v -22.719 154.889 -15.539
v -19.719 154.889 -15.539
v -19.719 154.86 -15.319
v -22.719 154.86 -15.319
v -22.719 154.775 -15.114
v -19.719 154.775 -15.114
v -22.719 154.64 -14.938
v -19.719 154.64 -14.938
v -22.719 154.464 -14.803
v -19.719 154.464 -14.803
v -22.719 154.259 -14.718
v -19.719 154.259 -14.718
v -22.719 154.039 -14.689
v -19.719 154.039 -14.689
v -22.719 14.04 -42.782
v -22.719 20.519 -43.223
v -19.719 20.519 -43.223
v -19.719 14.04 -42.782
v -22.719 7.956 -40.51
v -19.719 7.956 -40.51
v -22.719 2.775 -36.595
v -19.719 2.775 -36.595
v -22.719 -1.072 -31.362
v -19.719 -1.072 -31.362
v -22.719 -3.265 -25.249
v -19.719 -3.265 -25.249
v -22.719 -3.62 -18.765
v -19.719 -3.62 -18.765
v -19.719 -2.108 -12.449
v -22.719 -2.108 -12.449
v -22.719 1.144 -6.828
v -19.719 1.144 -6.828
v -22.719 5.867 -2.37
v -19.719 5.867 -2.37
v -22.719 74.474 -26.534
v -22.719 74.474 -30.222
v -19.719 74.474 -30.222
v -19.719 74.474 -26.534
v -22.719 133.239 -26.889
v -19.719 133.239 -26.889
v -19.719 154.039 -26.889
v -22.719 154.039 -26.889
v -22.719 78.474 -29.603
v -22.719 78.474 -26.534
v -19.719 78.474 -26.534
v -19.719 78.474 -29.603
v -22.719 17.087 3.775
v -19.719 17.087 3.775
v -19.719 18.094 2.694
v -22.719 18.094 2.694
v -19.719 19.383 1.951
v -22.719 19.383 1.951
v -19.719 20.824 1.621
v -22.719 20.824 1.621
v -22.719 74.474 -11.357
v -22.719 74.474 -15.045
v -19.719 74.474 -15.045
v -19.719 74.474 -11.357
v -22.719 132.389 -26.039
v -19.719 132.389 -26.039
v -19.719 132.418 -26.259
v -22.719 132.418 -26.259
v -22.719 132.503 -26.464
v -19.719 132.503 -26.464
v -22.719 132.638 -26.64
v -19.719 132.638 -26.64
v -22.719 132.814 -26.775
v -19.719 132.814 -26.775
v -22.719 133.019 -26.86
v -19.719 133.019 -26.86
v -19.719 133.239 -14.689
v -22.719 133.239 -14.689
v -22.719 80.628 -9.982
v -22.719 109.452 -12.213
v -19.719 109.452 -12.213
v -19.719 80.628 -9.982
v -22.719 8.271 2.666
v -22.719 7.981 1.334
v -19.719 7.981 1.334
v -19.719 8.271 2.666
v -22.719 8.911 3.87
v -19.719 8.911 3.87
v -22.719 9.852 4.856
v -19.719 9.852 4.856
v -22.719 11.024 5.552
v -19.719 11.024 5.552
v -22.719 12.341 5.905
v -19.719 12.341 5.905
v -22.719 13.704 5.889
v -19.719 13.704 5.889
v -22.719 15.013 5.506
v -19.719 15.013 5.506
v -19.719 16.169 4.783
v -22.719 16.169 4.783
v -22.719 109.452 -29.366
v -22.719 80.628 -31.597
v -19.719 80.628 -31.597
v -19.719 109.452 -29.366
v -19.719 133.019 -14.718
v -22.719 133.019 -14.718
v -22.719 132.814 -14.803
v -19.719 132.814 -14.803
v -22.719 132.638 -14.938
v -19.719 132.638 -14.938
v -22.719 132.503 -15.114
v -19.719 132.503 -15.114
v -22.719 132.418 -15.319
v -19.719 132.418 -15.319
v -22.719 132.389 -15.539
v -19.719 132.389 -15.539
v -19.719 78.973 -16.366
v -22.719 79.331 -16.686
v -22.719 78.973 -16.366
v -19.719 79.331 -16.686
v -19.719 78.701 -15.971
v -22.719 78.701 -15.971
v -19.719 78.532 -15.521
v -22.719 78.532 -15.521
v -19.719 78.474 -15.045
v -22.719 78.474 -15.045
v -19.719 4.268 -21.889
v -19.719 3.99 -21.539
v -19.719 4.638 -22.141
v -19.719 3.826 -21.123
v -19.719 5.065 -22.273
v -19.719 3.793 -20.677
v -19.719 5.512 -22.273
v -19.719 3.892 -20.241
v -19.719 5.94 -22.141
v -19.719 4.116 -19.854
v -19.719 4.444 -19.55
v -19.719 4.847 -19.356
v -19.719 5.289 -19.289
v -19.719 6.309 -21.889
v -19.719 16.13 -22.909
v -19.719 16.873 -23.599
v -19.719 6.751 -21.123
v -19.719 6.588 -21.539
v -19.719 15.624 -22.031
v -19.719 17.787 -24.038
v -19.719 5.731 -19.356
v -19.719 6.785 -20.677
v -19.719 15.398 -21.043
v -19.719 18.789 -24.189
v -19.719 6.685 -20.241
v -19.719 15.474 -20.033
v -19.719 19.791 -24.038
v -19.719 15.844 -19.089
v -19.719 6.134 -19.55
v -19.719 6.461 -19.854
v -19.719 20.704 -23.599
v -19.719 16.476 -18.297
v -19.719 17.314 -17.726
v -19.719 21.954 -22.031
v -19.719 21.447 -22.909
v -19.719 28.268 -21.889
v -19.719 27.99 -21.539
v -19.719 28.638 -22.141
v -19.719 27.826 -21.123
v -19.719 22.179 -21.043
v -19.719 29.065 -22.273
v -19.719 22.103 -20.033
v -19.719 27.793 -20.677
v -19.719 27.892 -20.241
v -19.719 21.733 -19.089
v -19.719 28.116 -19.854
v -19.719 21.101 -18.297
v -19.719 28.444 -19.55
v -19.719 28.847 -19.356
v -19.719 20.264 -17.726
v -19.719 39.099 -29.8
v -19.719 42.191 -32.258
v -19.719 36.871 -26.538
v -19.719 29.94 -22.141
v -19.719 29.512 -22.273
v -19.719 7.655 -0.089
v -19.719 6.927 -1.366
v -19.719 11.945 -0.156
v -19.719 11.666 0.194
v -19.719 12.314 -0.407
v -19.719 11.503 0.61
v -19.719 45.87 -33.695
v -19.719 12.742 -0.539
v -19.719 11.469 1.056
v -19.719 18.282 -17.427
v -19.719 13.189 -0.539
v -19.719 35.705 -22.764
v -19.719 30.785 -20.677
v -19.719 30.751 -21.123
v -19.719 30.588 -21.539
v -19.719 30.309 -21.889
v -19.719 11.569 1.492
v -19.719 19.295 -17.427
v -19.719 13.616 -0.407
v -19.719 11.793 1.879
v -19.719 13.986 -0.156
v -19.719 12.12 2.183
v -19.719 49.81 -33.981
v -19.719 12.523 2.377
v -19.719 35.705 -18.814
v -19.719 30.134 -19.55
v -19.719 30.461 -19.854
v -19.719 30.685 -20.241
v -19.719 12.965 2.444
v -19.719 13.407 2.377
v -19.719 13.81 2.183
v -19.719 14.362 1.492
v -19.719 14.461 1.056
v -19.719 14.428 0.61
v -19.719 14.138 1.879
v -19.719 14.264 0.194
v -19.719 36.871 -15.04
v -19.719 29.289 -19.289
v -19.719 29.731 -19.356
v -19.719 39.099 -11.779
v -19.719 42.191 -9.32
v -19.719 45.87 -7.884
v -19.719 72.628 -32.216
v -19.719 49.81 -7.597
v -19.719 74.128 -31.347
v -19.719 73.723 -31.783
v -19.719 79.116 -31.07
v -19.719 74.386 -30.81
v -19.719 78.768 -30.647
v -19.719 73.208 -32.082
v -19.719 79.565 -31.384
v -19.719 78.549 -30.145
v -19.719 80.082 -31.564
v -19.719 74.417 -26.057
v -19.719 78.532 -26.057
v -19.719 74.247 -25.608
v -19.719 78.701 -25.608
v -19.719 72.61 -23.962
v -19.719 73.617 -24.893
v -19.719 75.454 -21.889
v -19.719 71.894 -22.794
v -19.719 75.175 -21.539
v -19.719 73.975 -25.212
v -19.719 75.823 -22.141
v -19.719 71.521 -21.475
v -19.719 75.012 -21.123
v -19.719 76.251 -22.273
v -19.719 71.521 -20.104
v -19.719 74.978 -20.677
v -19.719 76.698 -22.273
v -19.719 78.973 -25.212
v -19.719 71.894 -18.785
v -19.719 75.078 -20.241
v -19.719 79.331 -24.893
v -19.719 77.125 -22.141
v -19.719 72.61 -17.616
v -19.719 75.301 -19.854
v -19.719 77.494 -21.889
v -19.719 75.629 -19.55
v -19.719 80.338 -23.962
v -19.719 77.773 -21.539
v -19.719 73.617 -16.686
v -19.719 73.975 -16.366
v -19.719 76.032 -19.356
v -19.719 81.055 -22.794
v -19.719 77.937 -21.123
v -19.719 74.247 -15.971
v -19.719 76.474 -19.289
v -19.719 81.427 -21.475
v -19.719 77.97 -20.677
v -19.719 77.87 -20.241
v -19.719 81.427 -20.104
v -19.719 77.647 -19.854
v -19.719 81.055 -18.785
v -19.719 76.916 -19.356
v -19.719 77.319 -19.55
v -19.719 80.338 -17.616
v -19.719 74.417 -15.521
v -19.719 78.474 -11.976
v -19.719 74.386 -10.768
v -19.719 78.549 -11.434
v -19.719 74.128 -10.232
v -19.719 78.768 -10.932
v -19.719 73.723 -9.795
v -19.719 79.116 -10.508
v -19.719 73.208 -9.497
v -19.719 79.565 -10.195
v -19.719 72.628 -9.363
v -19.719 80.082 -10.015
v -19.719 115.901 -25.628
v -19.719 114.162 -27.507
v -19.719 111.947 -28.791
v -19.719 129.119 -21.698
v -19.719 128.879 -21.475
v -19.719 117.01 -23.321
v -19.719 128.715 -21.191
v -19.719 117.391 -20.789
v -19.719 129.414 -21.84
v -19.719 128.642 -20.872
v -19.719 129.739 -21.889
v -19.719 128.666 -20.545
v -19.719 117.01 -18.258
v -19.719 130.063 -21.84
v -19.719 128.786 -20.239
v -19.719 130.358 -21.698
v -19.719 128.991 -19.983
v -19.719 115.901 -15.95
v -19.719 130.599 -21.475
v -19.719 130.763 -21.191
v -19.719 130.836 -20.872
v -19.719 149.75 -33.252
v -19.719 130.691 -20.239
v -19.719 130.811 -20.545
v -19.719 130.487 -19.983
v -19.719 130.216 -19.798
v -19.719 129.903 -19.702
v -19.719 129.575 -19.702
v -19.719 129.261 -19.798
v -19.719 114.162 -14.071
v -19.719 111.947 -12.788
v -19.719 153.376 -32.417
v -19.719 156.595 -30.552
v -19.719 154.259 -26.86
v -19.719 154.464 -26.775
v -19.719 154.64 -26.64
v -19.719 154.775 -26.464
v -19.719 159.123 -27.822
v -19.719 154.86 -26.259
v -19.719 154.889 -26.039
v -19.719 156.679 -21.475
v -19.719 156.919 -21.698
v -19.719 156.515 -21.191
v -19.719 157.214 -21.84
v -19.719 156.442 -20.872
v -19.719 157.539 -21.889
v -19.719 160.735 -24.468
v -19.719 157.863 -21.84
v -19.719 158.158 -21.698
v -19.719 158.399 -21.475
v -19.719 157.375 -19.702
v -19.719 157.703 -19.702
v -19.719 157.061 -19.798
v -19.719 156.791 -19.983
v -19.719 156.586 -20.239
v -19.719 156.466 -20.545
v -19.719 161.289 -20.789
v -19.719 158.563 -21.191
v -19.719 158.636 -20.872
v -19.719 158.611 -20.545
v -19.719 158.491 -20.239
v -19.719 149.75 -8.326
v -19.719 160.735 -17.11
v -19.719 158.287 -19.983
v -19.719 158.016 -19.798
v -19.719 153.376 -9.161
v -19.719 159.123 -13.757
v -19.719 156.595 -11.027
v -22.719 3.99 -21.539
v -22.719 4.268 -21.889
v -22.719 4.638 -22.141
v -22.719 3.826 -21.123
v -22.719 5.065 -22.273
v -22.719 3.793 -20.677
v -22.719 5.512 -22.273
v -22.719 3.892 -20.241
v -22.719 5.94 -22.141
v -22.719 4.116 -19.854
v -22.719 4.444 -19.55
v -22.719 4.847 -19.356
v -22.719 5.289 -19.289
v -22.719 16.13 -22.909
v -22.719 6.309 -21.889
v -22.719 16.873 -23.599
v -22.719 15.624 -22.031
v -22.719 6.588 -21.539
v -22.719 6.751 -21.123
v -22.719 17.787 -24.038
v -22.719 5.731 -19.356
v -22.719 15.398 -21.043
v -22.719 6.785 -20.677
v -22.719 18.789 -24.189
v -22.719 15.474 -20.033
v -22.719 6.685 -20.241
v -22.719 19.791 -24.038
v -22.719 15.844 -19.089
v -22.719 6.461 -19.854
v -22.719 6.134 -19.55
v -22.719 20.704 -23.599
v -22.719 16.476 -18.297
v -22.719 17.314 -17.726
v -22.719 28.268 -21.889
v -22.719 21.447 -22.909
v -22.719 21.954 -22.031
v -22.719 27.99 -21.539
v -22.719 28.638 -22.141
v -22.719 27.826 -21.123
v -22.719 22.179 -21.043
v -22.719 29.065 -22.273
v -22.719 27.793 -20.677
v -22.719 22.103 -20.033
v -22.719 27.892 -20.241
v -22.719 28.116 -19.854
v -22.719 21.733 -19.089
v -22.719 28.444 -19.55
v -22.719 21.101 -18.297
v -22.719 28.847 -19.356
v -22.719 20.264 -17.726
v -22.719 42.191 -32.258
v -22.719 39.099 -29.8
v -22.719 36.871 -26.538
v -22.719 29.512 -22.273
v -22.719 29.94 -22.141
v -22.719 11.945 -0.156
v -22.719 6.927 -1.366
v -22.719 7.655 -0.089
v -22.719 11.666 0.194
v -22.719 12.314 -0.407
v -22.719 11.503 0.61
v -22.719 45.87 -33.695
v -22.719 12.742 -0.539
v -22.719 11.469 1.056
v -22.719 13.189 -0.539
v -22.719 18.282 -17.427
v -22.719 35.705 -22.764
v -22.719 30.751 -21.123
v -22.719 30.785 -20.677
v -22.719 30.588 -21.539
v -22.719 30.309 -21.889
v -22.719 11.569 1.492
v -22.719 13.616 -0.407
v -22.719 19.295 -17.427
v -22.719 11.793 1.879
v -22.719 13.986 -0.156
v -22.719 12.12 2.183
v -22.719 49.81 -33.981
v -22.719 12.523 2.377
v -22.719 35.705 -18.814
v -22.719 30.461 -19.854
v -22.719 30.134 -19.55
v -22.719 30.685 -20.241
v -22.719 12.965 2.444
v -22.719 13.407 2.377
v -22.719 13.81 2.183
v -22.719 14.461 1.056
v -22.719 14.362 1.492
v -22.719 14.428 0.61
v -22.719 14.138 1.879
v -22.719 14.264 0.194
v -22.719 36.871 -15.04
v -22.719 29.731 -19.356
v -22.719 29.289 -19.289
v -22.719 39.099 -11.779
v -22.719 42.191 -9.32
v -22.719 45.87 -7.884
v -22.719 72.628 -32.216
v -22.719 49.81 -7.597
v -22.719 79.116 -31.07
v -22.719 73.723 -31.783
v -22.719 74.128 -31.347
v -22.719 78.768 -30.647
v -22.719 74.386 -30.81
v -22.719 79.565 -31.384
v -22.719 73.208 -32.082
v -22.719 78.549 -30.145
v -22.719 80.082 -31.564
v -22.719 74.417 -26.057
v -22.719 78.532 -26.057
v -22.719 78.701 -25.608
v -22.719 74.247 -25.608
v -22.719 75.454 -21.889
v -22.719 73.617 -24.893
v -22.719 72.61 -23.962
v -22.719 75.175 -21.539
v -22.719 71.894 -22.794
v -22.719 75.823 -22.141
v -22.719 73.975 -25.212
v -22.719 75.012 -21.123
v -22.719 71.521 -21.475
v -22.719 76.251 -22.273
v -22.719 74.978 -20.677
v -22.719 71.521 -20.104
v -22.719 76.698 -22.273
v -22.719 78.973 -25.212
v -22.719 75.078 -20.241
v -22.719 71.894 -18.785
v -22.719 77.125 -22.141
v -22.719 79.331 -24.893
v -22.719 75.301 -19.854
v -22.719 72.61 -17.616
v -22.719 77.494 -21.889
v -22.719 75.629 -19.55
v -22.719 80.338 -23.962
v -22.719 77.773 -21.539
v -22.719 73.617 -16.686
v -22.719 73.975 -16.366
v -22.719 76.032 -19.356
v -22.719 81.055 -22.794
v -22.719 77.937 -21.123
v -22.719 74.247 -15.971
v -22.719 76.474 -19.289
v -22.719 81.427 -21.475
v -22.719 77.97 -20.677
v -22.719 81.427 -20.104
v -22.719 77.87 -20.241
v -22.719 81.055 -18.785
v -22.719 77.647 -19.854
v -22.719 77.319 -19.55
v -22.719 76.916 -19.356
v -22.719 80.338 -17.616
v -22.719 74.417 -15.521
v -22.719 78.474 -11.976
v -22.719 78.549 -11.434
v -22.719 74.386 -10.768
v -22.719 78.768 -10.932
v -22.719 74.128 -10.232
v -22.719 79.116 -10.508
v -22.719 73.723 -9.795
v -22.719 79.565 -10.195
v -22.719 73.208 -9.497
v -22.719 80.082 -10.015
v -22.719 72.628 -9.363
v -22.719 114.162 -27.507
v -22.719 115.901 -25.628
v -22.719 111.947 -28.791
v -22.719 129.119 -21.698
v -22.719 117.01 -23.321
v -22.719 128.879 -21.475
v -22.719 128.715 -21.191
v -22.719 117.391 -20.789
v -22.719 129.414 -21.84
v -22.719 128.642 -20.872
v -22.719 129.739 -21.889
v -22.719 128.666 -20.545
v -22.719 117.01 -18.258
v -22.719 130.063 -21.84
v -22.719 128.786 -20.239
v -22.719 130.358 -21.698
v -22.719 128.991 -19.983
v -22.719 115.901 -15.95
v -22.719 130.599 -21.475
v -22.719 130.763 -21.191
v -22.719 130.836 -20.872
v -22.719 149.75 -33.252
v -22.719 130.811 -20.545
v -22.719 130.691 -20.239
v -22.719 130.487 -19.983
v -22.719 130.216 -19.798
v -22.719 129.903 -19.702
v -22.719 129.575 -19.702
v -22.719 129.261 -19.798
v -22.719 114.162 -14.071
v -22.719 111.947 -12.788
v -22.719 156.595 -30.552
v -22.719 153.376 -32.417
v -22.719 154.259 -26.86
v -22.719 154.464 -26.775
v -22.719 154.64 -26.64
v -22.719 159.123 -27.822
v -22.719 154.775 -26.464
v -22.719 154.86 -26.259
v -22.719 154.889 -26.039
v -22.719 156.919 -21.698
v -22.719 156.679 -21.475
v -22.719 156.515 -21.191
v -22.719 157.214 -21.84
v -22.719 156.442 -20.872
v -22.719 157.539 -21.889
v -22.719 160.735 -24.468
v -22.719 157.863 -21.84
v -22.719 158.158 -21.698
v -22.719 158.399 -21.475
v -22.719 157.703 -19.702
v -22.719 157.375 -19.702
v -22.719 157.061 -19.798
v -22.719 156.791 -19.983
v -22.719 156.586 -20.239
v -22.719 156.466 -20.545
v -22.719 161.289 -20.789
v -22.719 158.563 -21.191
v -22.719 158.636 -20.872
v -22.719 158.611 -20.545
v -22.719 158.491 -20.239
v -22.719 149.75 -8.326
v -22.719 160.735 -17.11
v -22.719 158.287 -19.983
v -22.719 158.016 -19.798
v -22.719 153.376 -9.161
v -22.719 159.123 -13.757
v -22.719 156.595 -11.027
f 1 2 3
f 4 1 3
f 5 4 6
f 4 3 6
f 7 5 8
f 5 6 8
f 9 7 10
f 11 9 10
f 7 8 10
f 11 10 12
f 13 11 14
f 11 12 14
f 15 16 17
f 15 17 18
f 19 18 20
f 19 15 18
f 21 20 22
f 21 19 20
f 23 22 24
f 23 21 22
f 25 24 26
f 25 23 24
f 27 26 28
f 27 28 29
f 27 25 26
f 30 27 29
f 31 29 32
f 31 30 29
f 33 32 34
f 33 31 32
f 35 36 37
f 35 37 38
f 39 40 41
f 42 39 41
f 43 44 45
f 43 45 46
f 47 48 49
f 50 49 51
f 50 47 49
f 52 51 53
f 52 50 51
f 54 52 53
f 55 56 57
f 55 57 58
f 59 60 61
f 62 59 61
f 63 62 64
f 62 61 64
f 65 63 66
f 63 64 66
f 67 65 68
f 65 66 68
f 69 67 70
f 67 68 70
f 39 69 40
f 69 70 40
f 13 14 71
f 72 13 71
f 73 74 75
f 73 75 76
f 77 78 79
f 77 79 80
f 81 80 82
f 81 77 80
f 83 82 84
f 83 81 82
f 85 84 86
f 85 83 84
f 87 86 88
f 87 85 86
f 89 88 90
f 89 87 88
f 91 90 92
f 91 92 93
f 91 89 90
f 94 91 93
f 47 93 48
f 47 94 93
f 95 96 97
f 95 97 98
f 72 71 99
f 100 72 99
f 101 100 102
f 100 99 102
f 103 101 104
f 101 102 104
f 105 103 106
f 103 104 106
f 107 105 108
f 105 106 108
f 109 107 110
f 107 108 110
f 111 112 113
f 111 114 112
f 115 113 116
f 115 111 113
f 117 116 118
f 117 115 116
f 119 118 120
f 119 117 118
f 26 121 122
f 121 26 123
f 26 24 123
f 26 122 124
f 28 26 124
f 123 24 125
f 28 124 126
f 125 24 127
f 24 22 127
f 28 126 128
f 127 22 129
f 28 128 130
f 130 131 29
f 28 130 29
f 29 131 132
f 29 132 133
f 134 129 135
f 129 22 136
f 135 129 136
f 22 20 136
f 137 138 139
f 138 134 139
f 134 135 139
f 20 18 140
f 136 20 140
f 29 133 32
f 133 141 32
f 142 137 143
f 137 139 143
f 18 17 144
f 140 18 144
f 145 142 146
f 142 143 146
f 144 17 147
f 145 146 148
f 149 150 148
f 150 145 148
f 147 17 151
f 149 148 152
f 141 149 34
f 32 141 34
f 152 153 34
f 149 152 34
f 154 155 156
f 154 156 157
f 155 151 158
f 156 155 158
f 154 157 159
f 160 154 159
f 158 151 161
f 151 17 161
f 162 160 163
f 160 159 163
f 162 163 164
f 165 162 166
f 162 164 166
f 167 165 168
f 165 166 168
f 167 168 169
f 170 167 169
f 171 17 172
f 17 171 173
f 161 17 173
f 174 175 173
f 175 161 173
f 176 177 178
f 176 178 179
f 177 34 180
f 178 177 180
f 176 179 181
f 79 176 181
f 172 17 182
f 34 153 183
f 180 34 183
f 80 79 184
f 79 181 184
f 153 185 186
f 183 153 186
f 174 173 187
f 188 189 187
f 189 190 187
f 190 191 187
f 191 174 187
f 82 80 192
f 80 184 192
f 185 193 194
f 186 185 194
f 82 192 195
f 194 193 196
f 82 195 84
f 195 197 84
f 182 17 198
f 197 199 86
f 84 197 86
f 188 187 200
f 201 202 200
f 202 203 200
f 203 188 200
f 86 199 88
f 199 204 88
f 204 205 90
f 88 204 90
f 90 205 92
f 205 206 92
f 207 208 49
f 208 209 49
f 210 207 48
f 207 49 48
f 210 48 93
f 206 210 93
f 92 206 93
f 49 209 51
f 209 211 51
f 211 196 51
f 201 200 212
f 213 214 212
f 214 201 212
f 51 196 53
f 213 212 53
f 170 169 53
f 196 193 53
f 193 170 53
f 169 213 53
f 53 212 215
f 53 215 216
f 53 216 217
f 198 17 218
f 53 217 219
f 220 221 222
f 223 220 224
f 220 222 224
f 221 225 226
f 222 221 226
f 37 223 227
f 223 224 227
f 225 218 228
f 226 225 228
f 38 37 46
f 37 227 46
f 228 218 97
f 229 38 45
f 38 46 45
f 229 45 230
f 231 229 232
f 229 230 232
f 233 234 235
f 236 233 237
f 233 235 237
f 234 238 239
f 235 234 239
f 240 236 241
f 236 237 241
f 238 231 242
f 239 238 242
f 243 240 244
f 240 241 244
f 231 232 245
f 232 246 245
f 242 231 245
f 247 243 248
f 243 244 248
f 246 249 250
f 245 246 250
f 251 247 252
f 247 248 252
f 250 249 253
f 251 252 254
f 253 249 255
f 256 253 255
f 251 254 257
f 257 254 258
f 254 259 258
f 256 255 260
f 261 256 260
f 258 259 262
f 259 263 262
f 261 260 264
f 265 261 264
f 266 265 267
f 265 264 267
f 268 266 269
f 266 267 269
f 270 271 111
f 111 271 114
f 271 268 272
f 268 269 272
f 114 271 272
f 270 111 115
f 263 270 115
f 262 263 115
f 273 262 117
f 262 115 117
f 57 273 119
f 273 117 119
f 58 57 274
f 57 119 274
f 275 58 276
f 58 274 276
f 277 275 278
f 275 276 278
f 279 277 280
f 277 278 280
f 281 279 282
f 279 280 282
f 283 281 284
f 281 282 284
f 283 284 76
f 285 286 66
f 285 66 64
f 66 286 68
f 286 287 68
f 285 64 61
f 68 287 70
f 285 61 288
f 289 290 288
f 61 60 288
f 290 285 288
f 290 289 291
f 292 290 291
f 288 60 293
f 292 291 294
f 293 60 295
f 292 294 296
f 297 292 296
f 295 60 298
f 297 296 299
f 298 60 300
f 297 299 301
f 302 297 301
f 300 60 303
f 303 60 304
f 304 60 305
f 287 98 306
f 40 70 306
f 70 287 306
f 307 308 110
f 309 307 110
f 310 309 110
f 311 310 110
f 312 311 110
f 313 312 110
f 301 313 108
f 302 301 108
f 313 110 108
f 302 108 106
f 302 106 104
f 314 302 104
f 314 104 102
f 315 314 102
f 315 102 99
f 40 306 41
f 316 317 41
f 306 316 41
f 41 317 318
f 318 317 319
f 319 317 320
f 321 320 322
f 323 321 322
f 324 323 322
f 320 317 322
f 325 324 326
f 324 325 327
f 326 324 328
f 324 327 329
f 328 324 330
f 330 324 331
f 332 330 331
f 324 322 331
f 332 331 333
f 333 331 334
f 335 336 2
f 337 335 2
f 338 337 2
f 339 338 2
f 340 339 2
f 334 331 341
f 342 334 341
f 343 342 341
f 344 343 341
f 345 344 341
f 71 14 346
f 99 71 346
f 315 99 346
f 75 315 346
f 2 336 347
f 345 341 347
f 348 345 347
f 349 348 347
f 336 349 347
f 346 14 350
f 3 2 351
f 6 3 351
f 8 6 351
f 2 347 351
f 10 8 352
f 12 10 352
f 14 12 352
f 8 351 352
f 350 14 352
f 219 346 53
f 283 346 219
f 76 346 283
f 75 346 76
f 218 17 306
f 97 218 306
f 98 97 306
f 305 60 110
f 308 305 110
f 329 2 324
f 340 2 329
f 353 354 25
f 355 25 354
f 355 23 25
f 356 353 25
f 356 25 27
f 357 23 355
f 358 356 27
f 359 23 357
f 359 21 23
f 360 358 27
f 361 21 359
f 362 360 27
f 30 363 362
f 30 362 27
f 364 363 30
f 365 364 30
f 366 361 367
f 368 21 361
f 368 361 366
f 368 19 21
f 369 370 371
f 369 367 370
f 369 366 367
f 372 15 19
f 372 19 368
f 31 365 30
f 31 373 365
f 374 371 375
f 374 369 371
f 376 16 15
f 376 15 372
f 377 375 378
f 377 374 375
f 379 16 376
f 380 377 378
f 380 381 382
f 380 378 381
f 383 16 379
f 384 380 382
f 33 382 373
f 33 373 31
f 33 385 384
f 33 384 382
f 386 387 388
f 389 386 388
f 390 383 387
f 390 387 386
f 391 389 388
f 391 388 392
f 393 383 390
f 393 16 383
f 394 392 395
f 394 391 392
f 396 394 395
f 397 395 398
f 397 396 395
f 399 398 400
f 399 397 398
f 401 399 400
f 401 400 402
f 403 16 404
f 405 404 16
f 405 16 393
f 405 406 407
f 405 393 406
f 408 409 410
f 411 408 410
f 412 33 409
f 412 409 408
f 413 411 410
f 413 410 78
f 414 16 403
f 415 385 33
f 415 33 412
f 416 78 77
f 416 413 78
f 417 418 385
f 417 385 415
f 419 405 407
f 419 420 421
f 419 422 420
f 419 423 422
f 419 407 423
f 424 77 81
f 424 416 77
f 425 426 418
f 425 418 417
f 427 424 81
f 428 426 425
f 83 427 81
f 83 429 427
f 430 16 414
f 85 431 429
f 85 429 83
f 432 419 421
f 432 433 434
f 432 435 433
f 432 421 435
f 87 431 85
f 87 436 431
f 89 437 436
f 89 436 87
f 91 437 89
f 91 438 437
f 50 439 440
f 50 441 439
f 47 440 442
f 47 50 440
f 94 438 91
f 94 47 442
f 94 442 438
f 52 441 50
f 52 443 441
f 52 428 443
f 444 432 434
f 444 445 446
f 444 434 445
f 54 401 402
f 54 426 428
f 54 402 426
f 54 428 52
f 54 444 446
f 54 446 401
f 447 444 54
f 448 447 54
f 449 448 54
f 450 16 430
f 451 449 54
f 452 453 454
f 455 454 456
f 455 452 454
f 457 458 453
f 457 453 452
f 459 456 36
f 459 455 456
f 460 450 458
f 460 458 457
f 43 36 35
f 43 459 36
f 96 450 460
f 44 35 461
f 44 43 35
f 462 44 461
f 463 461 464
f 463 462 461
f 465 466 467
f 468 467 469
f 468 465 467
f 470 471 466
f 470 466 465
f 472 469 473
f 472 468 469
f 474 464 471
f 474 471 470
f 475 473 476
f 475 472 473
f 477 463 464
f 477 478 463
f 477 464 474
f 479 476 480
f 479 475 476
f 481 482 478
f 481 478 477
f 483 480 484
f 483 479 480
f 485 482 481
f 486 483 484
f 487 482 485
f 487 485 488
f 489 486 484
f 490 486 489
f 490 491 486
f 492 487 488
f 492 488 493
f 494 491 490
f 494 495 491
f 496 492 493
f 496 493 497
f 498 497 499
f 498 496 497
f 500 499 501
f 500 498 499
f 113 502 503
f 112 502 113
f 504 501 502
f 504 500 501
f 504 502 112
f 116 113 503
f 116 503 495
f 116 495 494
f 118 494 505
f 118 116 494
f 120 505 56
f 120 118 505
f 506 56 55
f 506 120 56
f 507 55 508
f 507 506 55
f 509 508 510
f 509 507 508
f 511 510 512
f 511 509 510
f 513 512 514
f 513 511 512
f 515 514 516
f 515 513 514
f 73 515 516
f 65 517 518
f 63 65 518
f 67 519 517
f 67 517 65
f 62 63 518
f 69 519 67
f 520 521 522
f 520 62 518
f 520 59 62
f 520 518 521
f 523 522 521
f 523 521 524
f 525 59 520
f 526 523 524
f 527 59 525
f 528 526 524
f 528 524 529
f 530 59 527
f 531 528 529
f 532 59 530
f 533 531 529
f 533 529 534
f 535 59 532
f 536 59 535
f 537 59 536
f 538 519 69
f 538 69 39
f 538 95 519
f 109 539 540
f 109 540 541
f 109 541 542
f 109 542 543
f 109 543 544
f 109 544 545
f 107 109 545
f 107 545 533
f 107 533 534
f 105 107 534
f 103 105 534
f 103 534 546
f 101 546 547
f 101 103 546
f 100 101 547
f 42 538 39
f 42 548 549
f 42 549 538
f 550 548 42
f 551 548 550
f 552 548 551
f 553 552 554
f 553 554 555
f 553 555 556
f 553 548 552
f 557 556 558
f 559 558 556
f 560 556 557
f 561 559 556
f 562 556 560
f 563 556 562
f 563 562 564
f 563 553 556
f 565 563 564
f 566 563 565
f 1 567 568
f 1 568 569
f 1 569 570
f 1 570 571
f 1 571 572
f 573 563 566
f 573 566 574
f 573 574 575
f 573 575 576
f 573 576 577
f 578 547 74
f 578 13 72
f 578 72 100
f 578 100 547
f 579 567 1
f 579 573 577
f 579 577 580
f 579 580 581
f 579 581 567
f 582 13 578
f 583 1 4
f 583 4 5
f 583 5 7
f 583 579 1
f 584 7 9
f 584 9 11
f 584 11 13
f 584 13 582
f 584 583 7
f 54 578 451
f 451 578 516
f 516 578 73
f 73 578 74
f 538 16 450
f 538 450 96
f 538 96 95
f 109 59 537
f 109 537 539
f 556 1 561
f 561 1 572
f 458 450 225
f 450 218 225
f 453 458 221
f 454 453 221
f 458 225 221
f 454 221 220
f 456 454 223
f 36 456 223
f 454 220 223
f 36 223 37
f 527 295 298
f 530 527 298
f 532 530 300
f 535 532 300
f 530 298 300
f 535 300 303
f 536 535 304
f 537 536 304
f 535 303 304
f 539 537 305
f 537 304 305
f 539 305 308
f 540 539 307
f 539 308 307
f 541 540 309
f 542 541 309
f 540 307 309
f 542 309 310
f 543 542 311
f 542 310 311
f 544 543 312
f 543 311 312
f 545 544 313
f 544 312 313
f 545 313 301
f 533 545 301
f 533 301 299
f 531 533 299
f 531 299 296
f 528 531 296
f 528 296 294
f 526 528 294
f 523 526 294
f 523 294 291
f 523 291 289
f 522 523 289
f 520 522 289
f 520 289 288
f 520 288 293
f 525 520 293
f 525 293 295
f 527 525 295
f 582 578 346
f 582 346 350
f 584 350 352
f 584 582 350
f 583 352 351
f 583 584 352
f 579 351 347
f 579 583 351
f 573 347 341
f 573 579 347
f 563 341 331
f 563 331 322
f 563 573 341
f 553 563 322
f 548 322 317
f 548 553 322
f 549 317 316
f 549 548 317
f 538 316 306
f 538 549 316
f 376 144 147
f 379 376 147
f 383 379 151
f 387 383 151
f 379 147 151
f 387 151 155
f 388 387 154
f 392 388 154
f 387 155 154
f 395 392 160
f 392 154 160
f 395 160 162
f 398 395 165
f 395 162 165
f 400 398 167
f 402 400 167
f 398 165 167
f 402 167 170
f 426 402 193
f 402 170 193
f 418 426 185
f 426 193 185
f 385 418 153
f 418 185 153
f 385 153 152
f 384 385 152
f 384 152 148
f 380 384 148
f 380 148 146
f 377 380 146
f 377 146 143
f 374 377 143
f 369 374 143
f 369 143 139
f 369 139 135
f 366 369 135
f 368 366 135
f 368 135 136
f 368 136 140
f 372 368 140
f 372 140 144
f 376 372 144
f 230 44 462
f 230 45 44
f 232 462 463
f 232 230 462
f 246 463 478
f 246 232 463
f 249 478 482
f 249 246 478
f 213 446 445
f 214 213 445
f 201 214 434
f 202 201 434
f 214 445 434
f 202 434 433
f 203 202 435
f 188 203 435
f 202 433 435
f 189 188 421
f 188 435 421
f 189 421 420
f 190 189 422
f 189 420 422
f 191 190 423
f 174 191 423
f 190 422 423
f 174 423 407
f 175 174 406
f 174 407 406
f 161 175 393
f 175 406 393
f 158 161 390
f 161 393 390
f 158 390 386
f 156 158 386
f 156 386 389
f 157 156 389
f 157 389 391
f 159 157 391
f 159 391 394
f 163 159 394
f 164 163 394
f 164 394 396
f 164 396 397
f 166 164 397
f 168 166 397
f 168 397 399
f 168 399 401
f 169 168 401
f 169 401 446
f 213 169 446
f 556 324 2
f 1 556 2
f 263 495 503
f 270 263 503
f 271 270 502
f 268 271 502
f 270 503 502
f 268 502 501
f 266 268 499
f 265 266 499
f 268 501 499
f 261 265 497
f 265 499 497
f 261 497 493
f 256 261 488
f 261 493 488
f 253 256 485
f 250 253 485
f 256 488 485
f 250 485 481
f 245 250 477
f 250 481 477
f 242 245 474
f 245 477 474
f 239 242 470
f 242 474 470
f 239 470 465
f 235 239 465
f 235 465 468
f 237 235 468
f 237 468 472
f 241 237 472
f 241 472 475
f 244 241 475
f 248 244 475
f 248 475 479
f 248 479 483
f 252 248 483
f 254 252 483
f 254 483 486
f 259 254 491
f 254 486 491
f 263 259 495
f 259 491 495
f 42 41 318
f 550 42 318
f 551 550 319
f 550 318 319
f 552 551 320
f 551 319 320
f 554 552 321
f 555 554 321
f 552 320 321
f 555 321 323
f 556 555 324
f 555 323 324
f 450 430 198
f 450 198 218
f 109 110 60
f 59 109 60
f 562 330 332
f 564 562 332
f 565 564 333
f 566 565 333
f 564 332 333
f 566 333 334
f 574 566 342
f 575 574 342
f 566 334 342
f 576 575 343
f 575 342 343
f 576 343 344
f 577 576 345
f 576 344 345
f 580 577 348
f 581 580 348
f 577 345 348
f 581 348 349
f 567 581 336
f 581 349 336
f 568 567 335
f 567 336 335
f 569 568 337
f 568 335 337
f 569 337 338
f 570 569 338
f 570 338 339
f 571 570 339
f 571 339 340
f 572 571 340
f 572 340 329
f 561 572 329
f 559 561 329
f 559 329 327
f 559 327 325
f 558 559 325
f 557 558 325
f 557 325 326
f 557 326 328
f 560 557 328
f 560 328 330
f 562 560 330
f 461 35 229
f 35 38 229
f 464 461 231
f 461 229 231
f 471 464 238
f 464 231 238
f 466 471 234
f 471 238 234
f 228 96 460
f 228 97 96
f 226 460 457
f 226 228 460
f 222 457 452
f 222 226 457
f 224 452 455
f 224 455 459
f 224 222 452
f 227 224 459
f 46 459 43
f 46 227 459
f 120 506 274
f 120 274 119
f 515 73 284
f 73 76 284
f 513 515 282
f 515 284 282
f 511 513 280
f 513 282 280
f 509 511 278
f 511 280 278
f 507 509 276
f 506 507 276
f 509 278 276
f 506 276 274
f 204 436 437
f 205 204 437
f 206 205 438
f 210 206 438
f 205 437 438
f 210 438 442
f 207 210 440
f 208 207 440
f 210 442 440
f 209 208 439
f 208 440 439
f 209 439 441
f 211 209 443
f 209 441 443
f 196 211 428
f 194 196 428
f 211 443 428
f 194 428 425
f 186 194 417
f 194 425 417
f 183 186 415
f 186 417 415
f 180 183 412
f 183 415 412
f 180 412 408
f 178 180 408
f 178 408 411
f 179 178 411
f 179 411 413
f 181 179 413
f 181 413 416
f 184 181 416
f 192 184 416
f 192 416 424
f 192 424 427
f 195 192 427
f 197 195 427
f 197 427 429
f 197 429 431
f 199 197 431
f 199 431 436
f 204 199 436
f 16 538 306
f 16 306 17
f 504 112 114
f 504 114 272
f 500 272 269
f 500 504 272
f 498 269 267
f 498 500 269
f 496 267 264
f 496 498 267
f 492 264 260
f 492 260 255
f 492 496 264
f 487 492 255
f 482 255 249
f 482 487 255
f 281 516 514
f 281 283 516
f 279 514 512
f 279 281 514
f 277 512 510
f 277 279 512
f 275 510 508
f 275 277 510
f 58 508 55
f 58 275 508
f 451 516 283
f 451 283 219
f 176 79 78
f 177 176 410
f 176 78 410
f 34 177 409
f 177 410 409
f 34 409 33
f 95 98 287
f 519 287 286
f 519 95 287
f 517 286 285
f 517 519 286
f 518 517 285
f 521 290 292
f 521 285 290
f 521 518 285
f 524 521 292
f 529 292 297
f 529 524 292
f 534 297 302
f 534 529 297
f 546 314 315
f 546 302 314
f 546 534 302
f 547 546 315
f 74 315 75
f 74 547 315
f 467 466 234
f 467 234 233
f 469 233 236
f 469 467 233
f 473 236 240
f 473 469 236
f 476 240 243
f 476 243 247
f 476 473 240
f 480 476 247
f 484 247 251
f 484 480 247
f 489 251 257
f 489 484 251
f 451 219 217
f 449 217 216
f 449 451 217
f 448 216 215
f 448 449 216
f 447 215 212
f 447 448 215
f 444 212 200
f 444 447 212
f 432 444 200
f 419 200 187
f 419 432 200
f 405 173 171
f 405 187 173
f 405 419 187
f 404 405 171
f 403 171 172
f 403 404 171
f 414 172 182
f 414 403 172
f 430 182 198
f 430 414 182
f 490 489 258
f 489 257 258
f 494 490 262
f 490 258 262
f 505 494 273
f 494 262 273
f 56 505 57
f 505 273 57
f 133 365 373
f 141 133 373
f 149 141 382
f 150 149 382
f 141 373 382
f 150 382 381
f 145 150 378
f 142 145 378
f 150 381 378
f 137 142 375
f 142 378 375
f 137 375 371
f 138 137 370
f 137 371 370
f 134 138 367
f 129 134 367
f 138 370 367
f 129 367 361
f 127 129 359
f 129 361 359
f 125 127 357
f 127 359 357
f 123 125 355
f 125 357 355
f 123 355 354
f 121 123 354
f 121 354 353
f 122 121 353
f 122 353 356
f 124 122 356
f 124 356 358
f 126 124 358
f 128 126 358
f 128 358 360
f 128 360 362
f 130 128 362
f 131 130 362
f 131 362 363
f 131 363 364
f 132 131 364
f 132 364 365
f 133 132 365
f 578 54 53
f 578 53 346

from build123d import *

# Parameters (mm, degrees)
BOSS_EXTRUDE1_DEPTH = 3
CUT_EXTRUDE1_REACH  = 169.024
SKETCH3_R           = 1.1
CUT_EXTRUDE2_REACH  = 169.024
SKETCH5_R           = 3.4
CUT_EXTRUDE3_REACH  = 169.024
SKETCH7_R           = 1.5
BOSS_EXTRUDE3_DEPTH = 3
FILLET1_R           = 2
SKETCH8_R           = 5
BOSS_EXTRUDE4_DEPTH = 3
CUT_EXTRUDE4_REACH  = 169.024
SKETCH9_R           = 1.5
FILLET2_R           = 5
CUT_EXTRUDE5_REACH  = 169.024
SKETCH10_R          = 1.5


with BuildPart() as part:
    # Sketch1 → Boss-Extrude1 (new body)
    with BuildSketch(Plane(origin=(-22.718758449, 0, 0), x_dir=(0, 0, -1), z_dir=(1, 0, 0))):
        with BuildLine():
            Line((33.252275896, 149.750258484), (43.222646201, 20.519489254))
            ThreePointArc((43.222646201, 20.519489254), (20.789313015, -3.711279977), (-1.644020172, 20.519489254))
            Line((-1.644020172, 20.519489254), (8.326350133, 149.750258484))
            ThreePointArc((8.326350133, 149.750258484), (20.789313015, 161.288720023), (33.252275896, 149.750258484))
        make_face()
    extrude(amount=BOSS_EXTRUDE1_DEPTH)

    # Sketch3 → Cut-Extrude1 (cut, up to next)
    with BuildSketch(Plane(origin=(-19.718758449, 0, 0), x_dir=(0, 0, -1), z_dir=(1, 0, 0)), mode=Mode.PRIVATE) as cut_extrude1_sk1:
        with Locations((20.789313015, 157.538720023)):
            Circle(SKETCH3_R)
    cut_extrude1_tool1 = extrude(cut_extrude1_sk1.sketch, amount=-CUT_EXTRUDE1_REACH, mode=Mode.PRIVATE) & part.part
    # Sketch3 → Cut-Extrude1 (cut, up to next)
    with BuildSketch(Plane(origin=(-19.718758449, 0, 0), x_dir=(0, 0, -1), z_dir=(1, 0, 0)), mode=Mode.PRIVATE) as cut_extrude1_sk2:
        with Locations((20.789313015, 129.738720023)):
            Circle(SKETCH3_R)
    cut_extrude1_tool2 = extrude(cut_extrude1_sk2.sketch, amount=-CUT_EXTRUDE1_REACH, mode=Mode.PRIVATE) & part.part
    # Sketch3 → Cut-Extrude1 (cut, up to next)
    with BuildSketch(Plane(origin=(-19.718758449, 0, 0), x_dir=(0, 0, -1), z_dir=(1, 0, 0)), mode=Mode.PRIVATE) as cut_extrude1_sk3:
        with BuildLine():
            Line((14.689313015, 154.038720023), (14.689313015, 148.788720023))
            Line((14.689313015, 148.788720023), (14.689313015, 133.238720023))
            ThreePointArc((14.689313015, 133.238720023), (14.938272251, 132.637679259), (15.539313015, 132.388720023))
            Line((15.539313015, 132.388720023), (26.039313015, 132.388720023))
            ThreePointArc((26.039313015, 132.388720023), (26.640353779, 132.637679259), (26.889313015, 133.238720023))
            Line((26.889313015, 133.238720023), (26.889313015, 148.788720023))
            Line((26.889313015, 148.788720023), (26.889313015, 154.038720023))
            ThreePointArc((26.889313015, 154.038720023), (26.640353779, 154.639760787), (26.039313015, 154.888720023))
            Line((26.039313015, 154.888720023), (20.789313015, 154.888720023))
            Line((20.789313015, 154.888720023), (15.539313015, 154.888720023))
            ThreePointArc((15.539313015, 154.888720023), (14.938272251, 154.639760787), (14.689313015, 154.038720023))
        make_face()
    cut_extrude1_tool3 = extrude(cut_extrude1_sk3.sketch, amount=-CUT_EXTRUDE1_REACH, mode=Mode.PRIVATE) & part.part
    add(cut_extrude1_tool1.solids().sort_by_distance((-19.718758, 157.53872, -20.789313))[0], mode=Mode.SUBTRACT)
    add(cut_extrude1_tool2.solids().sort_by_distance((-19.718758, 129.73872, -20.789313))[0], mode=Mode.SUBTRACT)
    add(cut_extrude1_tool3.solids().sort_by_distance((-19.718758, 143.63872, -20.789313))[0], mode=Mode.SUBTRACT)

    # Sketch5 → Cut-Extrude2 (cut, up to next)
    with BuildSketch(Plane(origin=(-19.718758449, 0, 0), x_dir=(0, 0, -1), z_dir=(1, 0, 0)), mode=Mode.PRIVATE) as cut_extrude2_sk1:
        with Locations((20.789313015, 18.788720023)):
            Circle(SKETCH5_R)
    cut_extrude2_tool1 = extrude(cut_extrude2_sk1.sketch, amount=-CUT_EXTRUDE2_REACH, mode=Mode.PRIVATE) & part.part
    add(cut_extrude2_tool1.solids().sort_by_distance((-19.718758, 18.78872, -20.789313))[0], mode=Mode.SUBTRACT)

    # Sketch6 → Cut-Extrude3 (cut, up to next)
    with BuildSketch(Plane.ZY.offset(22.718758449), mode=Mode.PRIVATE) as cut_extrude3_sk1:
        with BuildLine():
            Line((-12.212541883, 109.452410499), (-7.597239032, 49.809553356))
            ThreePointArc((-7.597239032, 49.809553356), (-20.789313015, 35.557207763), (-33.981386998, 49.809553356))
            Line((-33.981386998, 49.809553356), (-29.366084146, 109.452410499))
            ThreePointArc((-29.366084146, 109.452410499), (-20.789313015, 117.391131783), (-12.212541883, 109.452410499))
        make_face()
    cut_extrude3_tool1 = extrude(cut_extrude3_sk1.sketch, amount=-CUT_EXTRUDE3_REACH, mode=Mode.PRIVATE) & part.part
    add(cut_extrude3_tool1.solids().sort_by_distance((-22.718758, 73.705728, -20.789313))[0], mode=Mode.SUBTRACT)

    # Sketch7 → Boss-Extrude3 (add)
    with BuildSketch(Plane.ZY.offset(22.718758449)):
        with BuildLine():
            Line((-32.072781677, 74.474169773), (-25.37188871, 74.474169773))
            ThreePointArc((-25.37188871, 74.474169773), (-20.789313015, 71.474169773), (-16.20673732, 74.474169773))
            Line((-16.20673732, 74.474169773), (-9.505844352, 74.474169773))
            Line((-9.505844352, 74.474169773), (-9.815373645, 78.474169773))
            Line((-9.815373645, 78.474169773), (-16.20673732, 78.474169773))
            ThreePointArc((-16.20673732, 78.474169773), (-20.789313015, 81.474169773), (-25.37188871, 78.474169773))
            Line((-25.37188871, 78.474169773), (-31.763252384, 78.474169773))
            Line((-31.763252384, 78.474169773), (-32.072781677, 74.474169773))
        make_face()
        with Locations((-20.789313015, 76.474169773)):
            Circle(SKETCH7_R, mode=Mode.SUBTRACT)
    extrude(amount=-BOSS_EXTRUDE3_DEPTH)

    # Fillet1
    fillet1_edges = [part.edges().sort_by_distance(p)[0] for p in [
        (-21.218758449, 74.474169773, -32.072781677),
        (-21.218758449, 78.474169773, -31.763252384),
        (-21.218758449, 78.474169773, -25.37188871),
        (-21.218758449, 78.474169773, -16.20673732),
        (-21.218758449, 78.474169773, -9.815373645),
        (-21.218758449, 74.474169773, -9.505844352),
        (-21.218758449, 74.474169773, -16.20673732),
        (-21.218758449, 74.474169773, -25.37188871),
    ]]
    fillet(fillet1_edges, radius=FILLET1_R)

    # Sketch8 → Boss-Extrude4 (add)
    with BuildSketch(Plane.ZY.offset(22.718758449)):
        with Locations((0.944018077, 12.965291508)):
            Circle(SKETCH8_R)
    extrude(amount=-BOSS_EXTRUDE4_DEPTH)

    # Sketch9 → Cut-Extrude4 (cut, up to next)
    with BuildSketch(Plane.ZY.offset(22.718758449), mode=Mode.PRIVATE) as cut_extrude4_sk1:
        with Locations((0.944018077, 12.965291508)):
            Circle(SKETCH9_R)
    cut_extrude4_tool1 = extrude(cut_extrude4_sk1.sketch, amount=-CUT_EXTRUDE4_REACH, mode=Mode.PRIVATE) & part.part
    add(cut_extrude4_tool1.solids().sort_by_distance((-22.718758, 12.965292, 0.944018))[0], mode=Mode.SUBTRACT)

    # Fillet2
    fillet2_edges = [part.edges().sort_by_distance(p)[0] for p in [
        (-21.218758449, 17.908803886, 1.693474793),
        (-21.218758449, 8.309355847, -0.878689557),
    ]]
    fillet(fillet2_edges, radius=FILLET2_R)

    # Sketch10 → Cut-Extrude5 (cut, up to next)
    with BuildSketch(Plane.ZY.offset(22.718758449), mode=Mode.PRIVATE) as cut_extrude5_sk1:
        with Locations((-20.789313015, 29.288720023)):
            Circle(SKETCH10_R)
    cut_extrude5_tool1 = extrude(cut_extrude5_sk1.sketch, amount=-CUT_EXTRUDE5_REACH, mode=Mode.PRIVATE) & part.part
    # Sketch10 → Cut-Extrude5 (cut, up to next)
    with BuildSketch(Plane.ZY.offset(22.718758449), mode=Mode.PRIVATE) as cut_extrude5_sk2:
        with Locations((-20.789313015, 5.288720023)):
            Circle(SKETCH10_R)
    cut_extrude5_tool2 = extrude(cut_extrude5_sk2.sketch, amount=-CUT_EXTRUDE5_REACH, mode=Mode.PRIVATE) & part.part
    add(cut_extrude5_tool1.solids().sort_by_distance((-22.718758, 29.28872, -20.789313))[0], mode=Mode.SUBTRACT)
    add(cut_extrude5_tool2.solids().sort_by_distance((-22.718758, 5.28872, -20.789313))[0], mode=Mode.SUBTRACT)


solid = part.part
